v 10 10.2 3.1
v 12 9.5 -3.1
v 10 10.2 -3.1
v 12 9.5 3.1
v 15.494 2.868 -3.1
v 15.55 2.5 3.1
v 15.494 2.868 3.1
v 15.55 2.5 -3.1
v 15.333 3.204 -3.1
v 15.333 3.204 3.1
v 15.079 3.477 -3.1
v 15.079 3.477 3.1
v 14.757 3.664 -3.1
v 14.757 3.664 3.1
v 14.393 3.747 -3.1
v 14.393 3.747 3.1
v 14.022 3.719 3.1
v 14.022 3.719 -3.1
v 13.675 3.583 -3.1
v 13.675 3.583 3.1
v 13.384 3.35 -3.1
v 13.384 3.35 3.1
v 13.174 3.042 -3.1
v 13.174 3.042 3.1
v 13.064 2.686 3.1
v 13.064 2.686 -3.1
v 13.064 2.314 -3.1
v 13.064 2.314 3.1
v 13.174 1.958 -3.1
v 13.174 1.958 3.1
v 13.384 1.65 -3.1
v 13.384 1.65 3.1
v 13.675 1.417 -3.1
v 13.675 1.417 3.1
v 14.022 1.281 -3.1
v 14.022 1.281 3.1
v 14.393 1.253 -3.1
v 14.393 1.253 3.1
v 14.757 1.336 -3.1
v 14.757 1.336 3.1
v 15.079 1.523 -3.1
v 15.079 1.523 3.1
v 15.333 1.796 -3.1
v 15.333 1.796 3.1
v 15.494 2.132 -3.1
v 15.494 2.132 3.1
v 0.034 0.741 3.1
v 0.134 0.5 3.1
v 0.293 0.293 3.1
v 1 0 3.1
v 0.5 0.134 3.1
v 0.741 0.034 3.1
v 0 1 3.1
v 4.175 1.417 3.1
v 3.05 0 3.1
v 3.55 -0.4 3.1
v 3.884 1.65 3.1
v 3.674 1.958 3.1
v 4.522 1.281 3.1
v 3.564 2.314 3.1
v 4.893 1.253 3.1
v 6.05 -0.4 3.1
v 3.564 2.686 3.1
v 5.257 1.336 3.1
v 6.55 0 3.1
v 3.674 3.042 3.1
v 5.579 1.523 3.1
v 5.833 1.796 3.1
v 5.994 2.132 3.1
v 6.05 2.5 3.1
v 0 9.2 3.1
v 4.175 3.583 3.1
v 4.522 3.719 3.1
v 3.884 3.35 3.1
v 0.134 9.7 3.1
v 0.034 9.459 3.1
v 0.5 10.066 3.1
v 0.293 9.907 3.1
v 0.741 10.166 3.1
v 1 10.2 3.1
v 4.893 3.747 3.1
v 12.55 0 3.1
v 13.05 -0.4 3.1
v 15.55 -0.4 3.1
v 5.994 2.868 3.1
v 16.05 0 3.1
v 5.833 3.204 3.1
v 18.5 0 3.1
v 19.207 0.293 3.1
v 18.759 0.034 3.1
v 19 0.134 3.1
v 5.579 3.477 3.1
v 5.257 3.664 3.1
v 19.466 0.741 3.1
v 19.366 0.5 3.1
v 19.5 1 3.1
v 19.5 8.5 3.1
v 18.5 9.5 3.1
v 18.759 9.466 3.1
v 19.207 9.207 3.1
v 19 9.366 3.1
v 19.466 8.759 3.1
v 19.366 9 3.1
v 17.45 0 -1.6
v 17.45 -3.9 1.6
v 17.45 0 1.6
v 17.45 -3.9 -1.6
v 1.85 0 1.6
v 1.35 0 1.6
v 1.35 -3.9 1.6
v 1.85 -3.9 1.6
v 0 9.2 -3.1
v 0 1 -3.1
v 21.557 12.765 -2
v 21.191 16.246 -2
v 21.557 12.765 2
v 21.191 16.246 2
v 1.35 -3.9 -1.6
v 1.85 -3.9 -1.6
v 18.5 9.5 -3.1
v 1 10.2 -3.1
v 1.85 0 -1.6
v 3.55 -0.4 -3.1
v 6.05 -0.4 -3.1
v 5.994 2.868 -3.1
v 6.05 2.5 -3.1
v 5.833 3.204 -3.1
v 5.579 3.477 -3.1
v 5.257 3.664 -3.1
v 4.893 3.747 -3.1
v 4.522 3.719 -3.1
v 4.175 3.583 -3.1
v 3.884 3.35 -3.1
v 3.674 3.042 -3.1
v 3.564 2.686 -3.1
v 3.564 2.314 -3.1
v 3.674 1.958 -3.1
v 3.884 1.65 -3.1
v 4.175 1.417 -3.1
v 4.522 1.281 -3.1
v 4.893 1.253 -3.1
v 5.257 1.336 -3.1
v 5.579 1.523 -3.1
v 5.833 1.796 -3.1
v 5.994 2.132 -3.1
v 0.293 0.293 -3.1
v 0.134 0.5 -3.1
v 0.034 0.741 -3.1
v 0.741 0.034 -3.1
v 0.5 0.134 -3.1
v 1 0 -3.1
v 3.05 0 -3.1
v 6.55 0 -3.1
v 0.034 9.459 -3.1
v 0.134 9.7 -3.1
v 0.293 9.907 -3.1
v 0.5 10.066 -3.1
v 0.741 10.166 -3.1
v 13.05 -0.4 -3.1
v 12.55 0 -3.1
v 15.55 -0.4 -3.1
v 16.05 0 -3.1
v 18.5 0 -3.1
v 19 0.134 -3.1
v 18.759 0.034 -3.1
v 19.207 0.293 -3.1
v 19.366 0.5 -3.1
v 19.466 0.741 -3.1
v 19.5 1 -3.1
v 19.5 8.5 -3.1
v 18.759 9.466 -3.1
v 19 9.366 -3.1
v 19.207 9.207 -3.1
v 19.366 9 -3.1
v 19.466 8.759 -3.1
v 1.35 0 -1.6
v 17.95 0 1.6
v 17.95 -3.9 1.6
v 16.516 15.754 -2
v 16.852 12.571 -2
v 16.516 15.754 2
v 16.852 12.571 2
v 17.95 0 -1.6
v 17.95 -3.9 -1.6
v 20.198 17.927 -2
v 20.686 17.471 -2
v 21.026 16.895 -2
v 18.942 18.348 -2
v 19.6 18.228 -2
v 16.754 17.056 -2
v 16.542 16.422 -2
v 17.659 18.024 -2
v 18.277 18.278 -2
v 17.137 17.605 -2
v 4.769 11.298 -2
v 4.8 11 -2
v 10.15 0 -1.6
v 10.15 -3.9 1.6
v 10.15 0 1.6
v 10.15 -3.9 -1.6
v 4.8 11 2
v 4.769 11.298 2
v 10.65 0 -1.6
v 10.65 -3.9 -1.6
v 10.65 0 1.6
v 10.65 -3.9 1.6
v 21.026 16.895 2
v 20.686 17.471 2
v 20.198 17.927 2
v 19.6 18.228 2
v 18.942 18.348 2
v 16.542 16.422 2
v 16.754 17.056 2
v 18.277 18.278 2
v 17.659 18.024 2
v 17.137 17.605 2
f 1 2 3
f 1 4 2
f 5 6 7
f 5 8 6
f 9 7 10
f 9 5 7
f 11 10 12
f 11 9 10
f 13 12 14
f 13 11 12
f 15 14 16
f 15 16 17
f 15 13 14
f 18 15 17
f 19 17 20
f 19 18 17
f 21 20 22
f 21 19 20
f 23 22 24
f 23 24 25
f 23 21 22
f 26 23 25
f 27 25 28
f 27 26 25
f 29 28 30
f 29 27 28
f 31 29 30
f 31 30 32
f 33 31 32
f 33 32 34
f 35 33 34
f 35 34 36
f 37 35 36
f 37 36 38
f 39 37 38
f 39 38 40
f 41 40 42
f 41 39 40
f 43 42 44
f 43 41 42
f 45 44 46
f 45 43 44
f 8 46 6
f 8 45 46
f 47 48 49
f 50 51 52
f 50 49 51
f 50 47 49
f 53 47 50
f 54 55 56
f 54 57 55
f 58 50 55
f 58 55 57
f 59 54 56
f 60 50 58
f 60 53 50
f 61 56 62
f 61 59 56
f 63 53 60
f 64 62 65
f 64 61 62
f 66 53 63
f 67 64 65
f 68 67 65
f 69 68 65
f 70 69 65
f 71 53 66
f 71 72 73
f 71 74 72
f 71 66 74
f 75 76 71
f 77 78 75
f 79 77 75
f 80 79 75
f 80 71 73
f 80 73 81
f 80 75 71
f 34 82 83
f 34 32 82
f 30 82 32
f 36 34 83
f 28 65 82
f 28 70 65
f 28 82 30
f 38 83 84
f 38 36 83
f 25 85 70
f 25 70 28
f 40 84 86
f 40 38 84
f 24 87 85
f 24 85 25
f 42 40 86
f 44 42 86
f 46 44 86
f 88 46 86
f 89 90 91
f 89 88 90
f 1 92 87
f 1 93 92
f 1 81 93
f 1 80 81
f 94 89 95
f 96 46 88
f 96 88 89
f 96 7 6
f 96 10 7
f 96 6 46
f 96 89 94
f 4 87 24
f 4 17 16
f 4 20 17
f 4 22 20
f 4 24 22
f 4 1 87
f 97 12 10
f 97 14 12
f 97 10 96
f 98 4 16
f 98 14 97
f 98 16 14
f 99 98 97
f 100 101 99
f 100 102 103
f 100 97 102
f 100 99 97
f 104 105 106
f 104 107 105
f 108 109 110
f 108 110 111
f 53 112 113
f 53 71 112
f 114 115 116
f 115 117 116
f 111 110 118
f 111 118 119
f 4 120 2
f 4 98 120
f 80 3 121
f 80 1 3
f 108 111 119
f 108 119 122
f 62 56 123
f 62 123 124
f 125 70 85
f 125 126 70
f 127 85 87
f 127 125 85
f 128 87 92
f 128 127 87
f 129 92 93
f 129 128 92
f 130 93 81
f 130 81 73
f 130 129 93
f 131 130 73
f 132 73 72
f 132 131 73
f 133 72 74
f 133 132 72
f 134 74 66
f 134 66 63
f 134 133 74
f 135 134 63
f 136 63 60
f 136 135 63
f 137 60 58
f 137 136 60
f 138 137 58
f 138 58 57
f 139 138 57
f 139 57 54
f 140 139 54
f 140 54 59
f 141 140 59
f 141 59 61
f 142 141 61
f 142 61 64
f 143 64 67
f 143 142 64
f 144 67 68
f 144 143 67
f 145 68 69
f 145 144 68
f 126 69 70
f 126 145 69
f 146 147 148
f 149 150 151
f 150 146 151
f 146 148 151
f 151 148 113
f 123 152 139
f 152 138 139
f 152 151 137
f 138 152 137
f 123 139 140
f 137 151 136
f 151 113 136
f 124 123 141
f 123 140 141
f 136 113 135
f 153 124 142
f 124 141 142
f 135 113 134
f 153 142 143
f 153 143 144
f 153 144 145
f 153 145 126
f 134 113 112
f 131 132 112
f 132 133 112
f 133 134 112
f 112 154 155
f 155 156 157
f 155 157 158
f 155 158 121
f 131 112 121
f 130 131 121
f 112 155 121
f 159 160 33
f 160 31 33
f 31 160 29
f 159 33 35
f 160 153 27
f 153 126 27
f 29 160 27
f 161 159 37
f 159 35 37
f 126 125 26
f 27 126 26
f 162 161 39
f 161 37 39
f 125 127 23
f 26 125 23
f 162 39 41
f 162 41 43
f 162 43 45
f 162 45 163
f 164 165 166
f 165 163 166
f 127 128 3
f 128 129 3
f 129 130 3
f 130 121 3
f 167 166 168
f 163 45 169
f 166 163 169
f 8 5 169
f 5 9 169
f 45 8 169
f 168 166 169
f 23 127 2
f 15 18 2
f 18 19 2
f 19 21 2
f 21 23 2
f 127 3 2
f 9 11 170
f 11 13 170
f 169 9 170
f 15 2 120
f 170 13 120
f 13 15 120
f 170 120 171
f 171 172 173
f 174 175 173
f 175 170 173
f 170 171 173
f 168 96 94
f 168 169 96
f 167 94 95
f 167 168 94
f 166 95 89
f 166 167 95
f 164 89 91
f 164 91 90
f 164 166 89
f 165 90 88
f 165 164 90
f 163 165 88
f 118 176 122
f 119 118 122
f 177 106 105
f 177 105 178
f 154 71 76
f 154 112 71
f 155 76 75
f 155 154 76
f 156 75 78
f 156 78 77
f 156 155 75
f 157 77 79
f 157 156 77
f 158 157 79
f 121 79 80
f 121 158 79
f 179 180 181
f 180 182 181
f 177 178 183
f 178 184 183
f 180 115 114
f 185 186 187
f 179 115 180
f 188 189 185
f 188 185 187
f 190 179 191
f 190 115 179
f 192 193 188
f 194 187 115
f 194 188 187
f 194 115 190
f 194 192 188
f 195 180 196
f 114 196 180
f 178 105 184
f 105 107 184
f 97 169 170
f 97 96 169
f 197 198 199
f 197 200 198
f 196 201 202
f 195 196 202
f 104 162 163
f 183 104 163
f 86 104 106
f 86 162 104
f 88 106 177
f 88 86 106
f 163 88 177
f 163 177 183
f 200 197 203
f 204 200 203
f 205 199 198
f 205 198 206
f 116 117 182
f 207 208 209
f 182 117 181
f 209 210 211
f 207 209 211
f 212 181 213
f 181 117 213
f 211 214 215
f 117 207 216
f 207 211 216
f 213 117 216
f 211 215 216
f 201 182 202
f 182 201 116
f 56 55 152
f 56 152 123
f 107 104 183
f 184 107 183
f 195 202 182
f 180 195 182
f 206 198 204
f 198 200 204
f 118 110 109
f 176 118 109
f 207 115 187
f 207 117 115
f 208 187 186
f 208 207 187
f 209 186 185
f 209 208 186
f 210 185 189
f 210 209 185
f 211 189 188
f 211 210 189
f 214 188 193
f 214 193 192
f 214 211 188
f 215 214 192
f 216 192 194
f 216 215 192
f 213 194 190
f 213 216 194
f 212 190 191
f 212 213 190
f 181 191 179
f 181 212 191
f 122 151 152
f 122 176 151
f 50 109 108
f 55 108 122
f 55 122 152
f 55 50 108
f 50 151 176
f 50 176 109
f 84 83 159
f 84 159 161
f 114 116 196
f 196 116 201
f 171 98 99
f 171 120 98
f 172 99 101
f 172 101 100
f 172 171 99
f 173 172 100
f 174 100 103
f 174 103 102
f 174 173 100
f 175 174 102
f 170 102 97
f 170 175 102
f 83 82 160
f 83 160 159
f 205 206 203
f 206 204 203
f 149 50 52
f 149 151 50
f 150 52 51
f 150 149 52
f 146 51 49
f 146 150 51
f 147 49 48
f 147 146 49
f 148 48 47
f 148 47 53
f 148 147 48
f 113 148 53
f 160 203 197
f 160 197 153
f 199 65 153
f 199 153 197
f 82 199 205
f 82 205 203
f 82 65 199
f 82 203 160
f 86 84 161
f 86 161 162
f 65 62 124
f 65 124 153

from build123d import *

# Parameters (mm, degrees)
PAD002_DEPTH = 2
SKETCH001_W  = 0.5
SKETCH001_H  = 3.9
PAD001_DEPTH = 1.6
SKETCH_R     = 1.25
PAD_DEPTH    = 3.1
FILLET_R     = 1


with BuildPart() as pad002:
    # Sketch002 → Pad002 (new body, symmetric)
    with BuildSketch(Plane.XY):
        with BuildLine():
            Line((4.768567, 11.298349), (16.85169, 12.571388))
            Line((16.85169, 12.571388), (16.516404, 15.753774))
            ThreePointArc((21.190534, 16.246226), (18.607244, 18.337065), (16.516404, 15.753774))
            Line((21.190534, 16.246226), (21.557253, 12.765491))
            Line((21.557253, 12.765491), (4.8, 11))
            Line((4.8, 11), (4.768567, 11.298349))
        make_face()
    extrude(amount=PAD002_DEPTH, both=True)


with BuildPart() as pad_contacts:
    # Sketch001 → Pad001 (new body, symmetric)
    with BuildSketch(Plane.XY):
        with Locations((17.7, -1.95)):
            Rectangle(SKETCH001_W, SKETCH001_H)
        with Locations((10.4, -1.95)):
            Rectangle(SKETCH001_W, SKETCH001_H)
        with Locations((1.6, -1.95)):
            Rectangle(SKETCH001_W, SKETCH001_H)
    extrude(amount=PAD001_DEPTH, both=True)


with BuildPart() as fusion:
    # Sketch → Pad (new body, symmetric)
    with BuildSketch(Plane.XY):
        Polygon((0, 0), (3.05, 0), (3.55, -0.4), (6.05, -0.4), (6.55, 0), (12.55, 0), (13.05, -0.4), (15.55, -0.4), (16.05, 0), (19.5, 0), (19.5, 9.5), (12, 9.5), (10, 10.2), (0, 10.2), align=None)
        with Locations((14.3, 2.5)):
            Circle(SKETCH_R, mode=Mode.SUBTRACT)
        with Locations((4.8, 2.5)):
            Circle(SKETCH_R, mode=Mode.SUBTRACT)
    extrude(amount=PAD_DEPTH, both=True)

    # Fillet
    fillet_edges = [fusion.edges().sort_by_distance(p)[0] for p in [
        (19.5, 9.5, 0),
        (0, 10.2, 0),
        (0, 0, 0),
        (19.5, 0, 0),
    ]]
    fillet(fillet_edges, radius=FILLET_R)

    # Fusion: union Pad002, Pad-contacts
    add(pad002.part)
    add(pad_contacts.part)


solid = fusion.part
